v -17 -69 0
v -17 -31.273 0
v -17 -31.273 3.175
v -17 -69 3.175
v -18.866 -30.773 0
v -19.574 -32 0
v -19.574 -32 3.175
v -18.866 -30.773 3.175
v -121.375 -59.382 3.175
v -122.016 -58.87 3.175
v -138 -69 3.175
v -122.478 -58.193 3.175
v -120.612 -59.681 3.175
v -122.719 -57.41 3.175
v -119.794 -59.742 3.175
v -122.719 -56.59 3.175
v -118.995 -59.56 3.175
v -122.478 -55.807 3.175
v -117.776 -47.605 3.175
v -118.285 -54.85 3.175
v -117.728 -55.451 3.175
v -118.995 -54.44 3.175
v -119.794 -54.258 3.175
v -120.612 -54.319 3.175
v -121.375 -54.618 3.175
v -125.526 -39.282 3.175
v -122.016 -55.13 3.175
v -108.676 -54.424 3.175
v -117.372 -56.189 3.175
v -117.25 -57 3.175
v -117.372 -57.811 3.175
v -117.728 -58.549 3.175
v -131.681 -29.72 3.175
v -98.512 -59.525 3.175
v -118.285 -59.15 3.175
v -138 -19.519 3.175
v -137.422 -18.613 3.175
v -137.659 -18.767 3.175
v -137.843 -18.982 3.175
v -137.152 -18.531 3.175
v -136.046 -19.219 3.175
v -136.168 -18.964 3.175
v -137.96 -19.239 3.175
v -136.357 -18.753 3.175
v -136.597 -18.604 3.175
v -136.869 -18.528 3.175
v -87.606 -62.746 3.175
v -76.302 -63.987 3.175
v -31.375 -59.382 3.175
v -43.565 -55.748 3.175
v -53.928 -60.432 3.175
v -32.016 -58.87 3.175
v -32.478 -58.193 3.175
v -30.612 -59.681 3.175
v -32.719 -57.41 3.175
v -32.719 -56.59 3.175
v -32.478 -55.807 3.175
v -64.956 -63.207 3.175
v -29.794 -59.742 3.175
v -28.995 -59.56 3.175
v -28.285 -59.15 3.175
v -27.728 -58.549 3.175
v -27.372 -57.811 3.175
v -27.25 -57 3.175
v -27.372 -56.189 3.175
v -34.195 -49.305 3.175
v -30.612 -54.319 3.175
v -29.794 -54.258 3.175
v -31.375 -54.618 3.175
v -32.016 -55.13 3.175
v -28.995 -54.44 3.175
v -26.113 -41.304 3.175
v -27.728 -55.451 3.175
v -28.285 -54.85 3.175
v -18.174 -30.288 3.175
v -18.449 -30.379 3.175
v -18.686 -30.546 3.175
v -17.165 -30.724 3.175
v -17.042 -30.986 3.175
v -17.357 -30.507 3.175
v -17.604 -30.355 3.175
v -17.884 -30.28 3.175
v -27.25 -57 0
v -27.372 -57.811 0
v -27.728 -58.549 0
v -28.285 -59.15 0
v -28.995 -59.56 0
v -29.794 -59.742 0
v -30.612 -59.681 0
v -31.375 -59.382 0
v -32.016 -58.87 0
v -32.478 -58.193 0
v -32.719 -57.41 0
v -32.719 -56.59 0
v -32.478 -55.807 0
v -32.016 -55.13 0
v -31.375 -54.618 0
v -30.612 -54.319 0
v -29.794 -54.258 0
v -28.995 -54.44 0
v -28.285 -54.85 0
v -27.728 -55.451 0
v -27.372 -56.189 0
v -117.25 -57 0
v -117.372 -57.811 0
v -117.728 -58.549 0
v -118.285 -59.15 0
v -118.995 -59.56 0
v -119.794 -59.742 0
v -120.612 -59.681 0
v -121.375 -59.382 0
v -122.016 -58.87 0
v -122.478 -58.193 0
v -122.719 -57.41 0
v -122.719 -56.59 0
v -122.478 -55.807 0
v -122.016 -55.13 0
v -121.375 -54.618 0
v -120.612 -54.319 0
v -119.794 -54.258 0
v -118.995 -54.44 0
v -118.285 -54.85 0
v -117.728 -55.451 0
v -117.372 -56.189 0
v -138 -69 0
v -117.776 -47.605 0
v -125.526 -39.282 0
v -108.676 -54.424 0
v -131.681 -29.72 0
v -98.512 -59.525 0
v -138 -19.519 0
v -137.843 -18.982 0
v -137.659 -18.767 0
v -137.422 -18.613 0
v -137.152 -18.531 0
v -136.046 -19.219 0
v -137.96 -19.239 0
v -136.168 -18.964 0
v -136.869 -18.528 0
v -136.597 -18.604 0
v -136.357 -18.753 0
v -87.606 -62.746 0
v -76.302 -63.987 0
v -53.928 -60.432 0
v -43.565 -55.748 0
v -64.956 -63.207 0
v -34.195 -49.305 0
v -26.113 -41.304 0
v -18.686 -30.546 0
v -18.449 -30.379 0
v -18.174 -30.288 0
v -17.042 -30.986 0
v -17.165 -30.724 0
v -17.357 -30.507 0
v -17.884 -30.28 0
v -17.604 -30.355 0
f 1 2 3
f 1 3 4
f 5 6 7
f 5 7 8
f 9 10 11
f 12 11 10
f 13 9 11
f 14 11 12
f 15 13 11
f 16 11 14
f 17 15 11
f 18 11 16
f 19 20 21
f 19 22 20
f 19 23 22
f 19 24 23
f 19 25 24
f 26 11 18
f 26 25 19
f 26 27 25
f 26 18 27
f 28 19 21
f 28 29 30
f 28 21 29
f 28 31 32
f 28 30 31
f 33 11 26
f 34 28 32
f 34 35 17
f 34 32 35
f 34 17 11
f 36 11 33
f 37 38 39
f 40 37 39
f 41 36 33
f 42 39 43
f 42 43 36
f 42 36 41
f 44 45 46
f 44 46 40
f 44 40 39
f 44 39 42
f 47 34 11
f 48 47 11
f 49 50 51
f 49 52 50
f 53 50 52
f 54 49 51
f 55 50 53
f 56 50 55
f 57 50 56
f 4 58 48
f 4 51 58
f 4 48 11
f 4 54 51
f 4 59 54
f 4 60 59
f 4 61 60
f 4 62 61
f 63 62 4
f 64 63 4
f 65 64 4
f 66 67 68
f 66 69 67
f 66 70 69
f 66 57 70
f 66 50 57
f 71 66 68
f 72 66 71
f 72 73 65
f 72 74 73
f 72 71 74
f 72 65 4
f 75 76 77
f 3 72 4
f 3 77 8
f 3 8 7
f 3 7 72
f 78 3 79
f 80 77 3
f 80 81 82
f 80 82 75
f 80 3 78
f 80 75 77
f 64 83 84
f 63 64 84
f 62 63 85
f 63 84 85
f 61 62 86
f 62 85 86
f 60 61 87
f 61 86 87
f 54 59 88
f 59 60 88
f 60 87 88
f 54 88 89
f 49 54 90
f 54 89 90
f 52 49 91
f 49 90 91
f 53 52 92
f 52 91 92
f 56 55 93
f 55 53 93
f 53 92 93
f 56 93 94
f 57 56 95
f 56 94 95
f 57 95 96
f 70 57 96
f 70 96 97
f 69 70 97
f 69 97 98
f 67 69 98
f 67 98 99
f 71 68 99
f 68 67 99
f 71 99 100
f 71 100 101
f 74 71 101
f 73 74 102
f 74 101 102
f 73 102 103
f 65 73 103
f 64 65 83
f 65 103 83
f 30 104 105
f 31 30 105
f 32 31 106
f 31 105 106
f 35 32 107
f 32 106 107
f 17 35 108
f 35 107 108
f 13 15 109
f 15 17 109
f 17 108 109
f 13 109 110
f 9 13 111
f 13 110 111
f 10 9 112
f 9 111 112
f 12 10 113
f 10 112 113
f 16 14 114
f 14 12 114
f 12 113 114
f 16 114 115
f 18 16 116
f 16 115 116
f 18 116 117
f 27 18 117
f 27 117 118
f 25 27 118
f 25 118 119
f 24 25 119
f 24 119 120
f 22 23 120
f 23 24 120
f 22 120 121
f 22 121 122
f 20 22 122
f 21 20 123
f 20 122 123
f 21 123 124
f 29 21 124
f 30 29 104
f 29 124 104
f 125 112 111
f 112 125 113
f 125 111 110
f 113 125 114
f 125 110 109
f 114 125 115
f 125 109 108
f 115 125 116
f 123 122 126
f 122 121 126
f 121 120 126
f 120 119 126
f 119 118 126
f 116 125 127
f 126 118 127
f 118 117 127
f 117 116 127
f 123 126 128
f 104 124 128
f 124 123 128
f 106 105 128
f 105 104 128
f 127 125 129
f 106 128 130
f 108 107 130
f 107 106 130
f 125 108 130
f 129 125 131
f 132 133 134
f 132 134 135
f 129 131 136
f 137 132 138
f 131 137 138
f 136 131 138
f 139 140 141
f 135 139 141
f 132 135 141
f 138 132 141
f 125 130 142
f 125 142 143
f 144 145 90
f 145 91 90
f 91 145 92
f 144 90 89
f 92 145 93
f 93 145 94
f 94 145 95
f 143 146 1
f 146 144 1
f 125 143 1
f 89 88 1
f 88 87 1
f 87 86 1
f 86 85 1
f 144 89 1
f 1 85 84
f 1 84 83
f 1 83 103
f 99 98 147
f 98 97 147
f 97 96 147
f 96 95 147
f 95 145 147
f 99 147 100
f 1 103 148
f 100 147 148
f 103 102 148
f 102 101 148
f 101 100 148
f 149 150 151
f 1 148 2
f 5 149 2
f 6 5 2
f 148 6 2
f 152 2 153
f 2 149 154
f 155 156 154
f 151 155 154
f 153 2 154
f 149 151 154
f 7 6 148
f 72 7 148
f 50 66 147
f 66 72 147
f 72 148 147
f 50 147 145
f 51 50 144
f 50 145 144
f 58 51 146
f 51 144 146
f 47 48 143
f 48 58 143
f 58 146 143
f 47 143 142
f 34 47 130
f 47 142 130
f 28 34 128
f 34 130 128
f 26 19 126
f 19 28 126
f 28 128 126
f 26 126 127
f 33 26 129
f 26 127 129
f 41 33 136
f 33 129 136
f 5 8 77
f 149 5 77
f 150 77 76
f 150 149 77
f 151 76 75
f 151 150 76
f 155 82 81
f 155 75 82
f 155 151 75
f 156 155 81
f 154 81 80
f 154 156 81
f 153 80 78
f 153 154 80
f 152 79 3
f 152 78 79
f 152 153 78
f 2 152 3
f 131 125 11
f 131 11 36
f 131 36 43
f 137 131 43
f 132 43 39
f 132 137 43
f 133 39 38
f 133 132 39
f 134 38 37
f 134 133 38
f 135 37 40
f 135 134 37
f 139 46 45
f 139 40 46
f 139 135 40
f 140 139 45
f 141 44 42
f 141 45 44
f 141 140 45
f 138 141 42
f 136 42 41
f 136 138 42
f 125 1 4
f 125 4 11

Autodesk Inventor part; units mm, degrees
ref_plane "YZ Plane" through (0, 0, 0) normal (1, 0, 0) x (0, 1, 0)
ref_plane "XZ Plane" through (0, 0, 0) normal (0, 1, 0) x (-1, 0, 0)
ref_plane "XY Plane" through (0, 0, 0) normal (0, 0, 1) x (1, 0, 0)
sketch "Sketch1" plane through (0, 0, 0) normal (0, 0, 1) x (1, 0, 0)
  arc A0 (-17, -31.2731) -> (-18.866, -30.7731) centre (-18, -31.2731) ccw
  line L0 (-17, -31.2731) -> (-17, -69)
  line L1 (-17, -69) -> (-138, -69)
  line L2 (-138, -69) -> (-138, -19.5192)
  arc A1 (-136.0462, -19.2189) -> (-138, -19.5192) centre (-137, -19.5192) ccw
  arc A2 (-136.0462, -19.2189) -> (-19.5744, -32) centre (-75, 0) ccw
  line L3 (-19.5744, -32) -> (-18.866, -30.7731)
  circle A3 centre (-30, -57) radius 2.75
  circle A4 centre (-120, -57) radius 2.75
  line L4 (-138, -69) -> (-17, -69)
  arc A5 (-17, -31.2731) -> (-18.866, -30.7731) centre (-18, -31.2731) ccw
  line L5 (-17, -31.2731) -> (-17, -69)
  line L6 (-17, -69) -> (-138, -69)
  line L7 (-138, -69) -> (-138, -19.5192)
  arc A6 (-136.0462, -19.2189) -> (-138, -19.5192) centre (-137, -19.5192) ccw
  arc A7 (-136.0462, -19.2189) -> (-19.5744, -32) centre (-75, 0) ccw
  line L8 (-19.5744, -32) -> (-18.866, -30.7731)
  circle A8 centre (-30, -57) radius 2.75
  circle A9 centre (-120, -57) radius 2.75
  point P0 (0, 0)
extrude "Extrusion1" add sketch "Sketch1" along normal blind 3.175
properties part number "1-8inch_Sieve_Piece1"
